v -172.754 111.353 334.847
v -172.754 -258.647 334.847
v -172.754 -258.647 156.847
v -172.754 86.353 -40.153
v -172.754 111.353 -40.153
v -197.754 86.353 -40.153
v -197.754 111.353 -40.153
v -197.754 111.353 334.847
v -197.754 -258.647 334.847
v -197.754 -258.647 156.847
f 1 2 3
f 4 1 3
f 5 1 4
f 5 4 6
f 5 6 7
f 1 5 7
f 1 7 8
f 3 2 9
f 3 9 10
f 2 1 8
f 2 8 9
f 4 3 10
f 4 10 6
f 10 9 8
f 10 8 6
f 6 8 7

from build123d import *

# Parameters (mm, degrees)
SALIENTE_EXTRUIR1_DEPTH      = 5
SALIENTE_EXTRUIR1_DEPTH_BACK = 20


with BuildPart() as part:
    # Croquis2 → Saliente-Extruir1 (new, two sides: drawn at the far end of the back side and taken through both)
    with BuildSketch(Plane.ZY.offset(192.754092983).offset(-SALIENTE_EXTRUIR1_DEPTH_BACK)):
        Polygon((334.847231333, 111.353262199), (334.847231333, -258.646737801), (156.847231333, -258.646737801), (-40.152768667, 86.353262199), (-40.152768667, 111.353262199), align=None)
    extrude(amount=SALIENTE_EXTRUIR1_DEPTH + SALIENTE_EXTRUIR1_DEPTH_BACK)


solid = part.part
